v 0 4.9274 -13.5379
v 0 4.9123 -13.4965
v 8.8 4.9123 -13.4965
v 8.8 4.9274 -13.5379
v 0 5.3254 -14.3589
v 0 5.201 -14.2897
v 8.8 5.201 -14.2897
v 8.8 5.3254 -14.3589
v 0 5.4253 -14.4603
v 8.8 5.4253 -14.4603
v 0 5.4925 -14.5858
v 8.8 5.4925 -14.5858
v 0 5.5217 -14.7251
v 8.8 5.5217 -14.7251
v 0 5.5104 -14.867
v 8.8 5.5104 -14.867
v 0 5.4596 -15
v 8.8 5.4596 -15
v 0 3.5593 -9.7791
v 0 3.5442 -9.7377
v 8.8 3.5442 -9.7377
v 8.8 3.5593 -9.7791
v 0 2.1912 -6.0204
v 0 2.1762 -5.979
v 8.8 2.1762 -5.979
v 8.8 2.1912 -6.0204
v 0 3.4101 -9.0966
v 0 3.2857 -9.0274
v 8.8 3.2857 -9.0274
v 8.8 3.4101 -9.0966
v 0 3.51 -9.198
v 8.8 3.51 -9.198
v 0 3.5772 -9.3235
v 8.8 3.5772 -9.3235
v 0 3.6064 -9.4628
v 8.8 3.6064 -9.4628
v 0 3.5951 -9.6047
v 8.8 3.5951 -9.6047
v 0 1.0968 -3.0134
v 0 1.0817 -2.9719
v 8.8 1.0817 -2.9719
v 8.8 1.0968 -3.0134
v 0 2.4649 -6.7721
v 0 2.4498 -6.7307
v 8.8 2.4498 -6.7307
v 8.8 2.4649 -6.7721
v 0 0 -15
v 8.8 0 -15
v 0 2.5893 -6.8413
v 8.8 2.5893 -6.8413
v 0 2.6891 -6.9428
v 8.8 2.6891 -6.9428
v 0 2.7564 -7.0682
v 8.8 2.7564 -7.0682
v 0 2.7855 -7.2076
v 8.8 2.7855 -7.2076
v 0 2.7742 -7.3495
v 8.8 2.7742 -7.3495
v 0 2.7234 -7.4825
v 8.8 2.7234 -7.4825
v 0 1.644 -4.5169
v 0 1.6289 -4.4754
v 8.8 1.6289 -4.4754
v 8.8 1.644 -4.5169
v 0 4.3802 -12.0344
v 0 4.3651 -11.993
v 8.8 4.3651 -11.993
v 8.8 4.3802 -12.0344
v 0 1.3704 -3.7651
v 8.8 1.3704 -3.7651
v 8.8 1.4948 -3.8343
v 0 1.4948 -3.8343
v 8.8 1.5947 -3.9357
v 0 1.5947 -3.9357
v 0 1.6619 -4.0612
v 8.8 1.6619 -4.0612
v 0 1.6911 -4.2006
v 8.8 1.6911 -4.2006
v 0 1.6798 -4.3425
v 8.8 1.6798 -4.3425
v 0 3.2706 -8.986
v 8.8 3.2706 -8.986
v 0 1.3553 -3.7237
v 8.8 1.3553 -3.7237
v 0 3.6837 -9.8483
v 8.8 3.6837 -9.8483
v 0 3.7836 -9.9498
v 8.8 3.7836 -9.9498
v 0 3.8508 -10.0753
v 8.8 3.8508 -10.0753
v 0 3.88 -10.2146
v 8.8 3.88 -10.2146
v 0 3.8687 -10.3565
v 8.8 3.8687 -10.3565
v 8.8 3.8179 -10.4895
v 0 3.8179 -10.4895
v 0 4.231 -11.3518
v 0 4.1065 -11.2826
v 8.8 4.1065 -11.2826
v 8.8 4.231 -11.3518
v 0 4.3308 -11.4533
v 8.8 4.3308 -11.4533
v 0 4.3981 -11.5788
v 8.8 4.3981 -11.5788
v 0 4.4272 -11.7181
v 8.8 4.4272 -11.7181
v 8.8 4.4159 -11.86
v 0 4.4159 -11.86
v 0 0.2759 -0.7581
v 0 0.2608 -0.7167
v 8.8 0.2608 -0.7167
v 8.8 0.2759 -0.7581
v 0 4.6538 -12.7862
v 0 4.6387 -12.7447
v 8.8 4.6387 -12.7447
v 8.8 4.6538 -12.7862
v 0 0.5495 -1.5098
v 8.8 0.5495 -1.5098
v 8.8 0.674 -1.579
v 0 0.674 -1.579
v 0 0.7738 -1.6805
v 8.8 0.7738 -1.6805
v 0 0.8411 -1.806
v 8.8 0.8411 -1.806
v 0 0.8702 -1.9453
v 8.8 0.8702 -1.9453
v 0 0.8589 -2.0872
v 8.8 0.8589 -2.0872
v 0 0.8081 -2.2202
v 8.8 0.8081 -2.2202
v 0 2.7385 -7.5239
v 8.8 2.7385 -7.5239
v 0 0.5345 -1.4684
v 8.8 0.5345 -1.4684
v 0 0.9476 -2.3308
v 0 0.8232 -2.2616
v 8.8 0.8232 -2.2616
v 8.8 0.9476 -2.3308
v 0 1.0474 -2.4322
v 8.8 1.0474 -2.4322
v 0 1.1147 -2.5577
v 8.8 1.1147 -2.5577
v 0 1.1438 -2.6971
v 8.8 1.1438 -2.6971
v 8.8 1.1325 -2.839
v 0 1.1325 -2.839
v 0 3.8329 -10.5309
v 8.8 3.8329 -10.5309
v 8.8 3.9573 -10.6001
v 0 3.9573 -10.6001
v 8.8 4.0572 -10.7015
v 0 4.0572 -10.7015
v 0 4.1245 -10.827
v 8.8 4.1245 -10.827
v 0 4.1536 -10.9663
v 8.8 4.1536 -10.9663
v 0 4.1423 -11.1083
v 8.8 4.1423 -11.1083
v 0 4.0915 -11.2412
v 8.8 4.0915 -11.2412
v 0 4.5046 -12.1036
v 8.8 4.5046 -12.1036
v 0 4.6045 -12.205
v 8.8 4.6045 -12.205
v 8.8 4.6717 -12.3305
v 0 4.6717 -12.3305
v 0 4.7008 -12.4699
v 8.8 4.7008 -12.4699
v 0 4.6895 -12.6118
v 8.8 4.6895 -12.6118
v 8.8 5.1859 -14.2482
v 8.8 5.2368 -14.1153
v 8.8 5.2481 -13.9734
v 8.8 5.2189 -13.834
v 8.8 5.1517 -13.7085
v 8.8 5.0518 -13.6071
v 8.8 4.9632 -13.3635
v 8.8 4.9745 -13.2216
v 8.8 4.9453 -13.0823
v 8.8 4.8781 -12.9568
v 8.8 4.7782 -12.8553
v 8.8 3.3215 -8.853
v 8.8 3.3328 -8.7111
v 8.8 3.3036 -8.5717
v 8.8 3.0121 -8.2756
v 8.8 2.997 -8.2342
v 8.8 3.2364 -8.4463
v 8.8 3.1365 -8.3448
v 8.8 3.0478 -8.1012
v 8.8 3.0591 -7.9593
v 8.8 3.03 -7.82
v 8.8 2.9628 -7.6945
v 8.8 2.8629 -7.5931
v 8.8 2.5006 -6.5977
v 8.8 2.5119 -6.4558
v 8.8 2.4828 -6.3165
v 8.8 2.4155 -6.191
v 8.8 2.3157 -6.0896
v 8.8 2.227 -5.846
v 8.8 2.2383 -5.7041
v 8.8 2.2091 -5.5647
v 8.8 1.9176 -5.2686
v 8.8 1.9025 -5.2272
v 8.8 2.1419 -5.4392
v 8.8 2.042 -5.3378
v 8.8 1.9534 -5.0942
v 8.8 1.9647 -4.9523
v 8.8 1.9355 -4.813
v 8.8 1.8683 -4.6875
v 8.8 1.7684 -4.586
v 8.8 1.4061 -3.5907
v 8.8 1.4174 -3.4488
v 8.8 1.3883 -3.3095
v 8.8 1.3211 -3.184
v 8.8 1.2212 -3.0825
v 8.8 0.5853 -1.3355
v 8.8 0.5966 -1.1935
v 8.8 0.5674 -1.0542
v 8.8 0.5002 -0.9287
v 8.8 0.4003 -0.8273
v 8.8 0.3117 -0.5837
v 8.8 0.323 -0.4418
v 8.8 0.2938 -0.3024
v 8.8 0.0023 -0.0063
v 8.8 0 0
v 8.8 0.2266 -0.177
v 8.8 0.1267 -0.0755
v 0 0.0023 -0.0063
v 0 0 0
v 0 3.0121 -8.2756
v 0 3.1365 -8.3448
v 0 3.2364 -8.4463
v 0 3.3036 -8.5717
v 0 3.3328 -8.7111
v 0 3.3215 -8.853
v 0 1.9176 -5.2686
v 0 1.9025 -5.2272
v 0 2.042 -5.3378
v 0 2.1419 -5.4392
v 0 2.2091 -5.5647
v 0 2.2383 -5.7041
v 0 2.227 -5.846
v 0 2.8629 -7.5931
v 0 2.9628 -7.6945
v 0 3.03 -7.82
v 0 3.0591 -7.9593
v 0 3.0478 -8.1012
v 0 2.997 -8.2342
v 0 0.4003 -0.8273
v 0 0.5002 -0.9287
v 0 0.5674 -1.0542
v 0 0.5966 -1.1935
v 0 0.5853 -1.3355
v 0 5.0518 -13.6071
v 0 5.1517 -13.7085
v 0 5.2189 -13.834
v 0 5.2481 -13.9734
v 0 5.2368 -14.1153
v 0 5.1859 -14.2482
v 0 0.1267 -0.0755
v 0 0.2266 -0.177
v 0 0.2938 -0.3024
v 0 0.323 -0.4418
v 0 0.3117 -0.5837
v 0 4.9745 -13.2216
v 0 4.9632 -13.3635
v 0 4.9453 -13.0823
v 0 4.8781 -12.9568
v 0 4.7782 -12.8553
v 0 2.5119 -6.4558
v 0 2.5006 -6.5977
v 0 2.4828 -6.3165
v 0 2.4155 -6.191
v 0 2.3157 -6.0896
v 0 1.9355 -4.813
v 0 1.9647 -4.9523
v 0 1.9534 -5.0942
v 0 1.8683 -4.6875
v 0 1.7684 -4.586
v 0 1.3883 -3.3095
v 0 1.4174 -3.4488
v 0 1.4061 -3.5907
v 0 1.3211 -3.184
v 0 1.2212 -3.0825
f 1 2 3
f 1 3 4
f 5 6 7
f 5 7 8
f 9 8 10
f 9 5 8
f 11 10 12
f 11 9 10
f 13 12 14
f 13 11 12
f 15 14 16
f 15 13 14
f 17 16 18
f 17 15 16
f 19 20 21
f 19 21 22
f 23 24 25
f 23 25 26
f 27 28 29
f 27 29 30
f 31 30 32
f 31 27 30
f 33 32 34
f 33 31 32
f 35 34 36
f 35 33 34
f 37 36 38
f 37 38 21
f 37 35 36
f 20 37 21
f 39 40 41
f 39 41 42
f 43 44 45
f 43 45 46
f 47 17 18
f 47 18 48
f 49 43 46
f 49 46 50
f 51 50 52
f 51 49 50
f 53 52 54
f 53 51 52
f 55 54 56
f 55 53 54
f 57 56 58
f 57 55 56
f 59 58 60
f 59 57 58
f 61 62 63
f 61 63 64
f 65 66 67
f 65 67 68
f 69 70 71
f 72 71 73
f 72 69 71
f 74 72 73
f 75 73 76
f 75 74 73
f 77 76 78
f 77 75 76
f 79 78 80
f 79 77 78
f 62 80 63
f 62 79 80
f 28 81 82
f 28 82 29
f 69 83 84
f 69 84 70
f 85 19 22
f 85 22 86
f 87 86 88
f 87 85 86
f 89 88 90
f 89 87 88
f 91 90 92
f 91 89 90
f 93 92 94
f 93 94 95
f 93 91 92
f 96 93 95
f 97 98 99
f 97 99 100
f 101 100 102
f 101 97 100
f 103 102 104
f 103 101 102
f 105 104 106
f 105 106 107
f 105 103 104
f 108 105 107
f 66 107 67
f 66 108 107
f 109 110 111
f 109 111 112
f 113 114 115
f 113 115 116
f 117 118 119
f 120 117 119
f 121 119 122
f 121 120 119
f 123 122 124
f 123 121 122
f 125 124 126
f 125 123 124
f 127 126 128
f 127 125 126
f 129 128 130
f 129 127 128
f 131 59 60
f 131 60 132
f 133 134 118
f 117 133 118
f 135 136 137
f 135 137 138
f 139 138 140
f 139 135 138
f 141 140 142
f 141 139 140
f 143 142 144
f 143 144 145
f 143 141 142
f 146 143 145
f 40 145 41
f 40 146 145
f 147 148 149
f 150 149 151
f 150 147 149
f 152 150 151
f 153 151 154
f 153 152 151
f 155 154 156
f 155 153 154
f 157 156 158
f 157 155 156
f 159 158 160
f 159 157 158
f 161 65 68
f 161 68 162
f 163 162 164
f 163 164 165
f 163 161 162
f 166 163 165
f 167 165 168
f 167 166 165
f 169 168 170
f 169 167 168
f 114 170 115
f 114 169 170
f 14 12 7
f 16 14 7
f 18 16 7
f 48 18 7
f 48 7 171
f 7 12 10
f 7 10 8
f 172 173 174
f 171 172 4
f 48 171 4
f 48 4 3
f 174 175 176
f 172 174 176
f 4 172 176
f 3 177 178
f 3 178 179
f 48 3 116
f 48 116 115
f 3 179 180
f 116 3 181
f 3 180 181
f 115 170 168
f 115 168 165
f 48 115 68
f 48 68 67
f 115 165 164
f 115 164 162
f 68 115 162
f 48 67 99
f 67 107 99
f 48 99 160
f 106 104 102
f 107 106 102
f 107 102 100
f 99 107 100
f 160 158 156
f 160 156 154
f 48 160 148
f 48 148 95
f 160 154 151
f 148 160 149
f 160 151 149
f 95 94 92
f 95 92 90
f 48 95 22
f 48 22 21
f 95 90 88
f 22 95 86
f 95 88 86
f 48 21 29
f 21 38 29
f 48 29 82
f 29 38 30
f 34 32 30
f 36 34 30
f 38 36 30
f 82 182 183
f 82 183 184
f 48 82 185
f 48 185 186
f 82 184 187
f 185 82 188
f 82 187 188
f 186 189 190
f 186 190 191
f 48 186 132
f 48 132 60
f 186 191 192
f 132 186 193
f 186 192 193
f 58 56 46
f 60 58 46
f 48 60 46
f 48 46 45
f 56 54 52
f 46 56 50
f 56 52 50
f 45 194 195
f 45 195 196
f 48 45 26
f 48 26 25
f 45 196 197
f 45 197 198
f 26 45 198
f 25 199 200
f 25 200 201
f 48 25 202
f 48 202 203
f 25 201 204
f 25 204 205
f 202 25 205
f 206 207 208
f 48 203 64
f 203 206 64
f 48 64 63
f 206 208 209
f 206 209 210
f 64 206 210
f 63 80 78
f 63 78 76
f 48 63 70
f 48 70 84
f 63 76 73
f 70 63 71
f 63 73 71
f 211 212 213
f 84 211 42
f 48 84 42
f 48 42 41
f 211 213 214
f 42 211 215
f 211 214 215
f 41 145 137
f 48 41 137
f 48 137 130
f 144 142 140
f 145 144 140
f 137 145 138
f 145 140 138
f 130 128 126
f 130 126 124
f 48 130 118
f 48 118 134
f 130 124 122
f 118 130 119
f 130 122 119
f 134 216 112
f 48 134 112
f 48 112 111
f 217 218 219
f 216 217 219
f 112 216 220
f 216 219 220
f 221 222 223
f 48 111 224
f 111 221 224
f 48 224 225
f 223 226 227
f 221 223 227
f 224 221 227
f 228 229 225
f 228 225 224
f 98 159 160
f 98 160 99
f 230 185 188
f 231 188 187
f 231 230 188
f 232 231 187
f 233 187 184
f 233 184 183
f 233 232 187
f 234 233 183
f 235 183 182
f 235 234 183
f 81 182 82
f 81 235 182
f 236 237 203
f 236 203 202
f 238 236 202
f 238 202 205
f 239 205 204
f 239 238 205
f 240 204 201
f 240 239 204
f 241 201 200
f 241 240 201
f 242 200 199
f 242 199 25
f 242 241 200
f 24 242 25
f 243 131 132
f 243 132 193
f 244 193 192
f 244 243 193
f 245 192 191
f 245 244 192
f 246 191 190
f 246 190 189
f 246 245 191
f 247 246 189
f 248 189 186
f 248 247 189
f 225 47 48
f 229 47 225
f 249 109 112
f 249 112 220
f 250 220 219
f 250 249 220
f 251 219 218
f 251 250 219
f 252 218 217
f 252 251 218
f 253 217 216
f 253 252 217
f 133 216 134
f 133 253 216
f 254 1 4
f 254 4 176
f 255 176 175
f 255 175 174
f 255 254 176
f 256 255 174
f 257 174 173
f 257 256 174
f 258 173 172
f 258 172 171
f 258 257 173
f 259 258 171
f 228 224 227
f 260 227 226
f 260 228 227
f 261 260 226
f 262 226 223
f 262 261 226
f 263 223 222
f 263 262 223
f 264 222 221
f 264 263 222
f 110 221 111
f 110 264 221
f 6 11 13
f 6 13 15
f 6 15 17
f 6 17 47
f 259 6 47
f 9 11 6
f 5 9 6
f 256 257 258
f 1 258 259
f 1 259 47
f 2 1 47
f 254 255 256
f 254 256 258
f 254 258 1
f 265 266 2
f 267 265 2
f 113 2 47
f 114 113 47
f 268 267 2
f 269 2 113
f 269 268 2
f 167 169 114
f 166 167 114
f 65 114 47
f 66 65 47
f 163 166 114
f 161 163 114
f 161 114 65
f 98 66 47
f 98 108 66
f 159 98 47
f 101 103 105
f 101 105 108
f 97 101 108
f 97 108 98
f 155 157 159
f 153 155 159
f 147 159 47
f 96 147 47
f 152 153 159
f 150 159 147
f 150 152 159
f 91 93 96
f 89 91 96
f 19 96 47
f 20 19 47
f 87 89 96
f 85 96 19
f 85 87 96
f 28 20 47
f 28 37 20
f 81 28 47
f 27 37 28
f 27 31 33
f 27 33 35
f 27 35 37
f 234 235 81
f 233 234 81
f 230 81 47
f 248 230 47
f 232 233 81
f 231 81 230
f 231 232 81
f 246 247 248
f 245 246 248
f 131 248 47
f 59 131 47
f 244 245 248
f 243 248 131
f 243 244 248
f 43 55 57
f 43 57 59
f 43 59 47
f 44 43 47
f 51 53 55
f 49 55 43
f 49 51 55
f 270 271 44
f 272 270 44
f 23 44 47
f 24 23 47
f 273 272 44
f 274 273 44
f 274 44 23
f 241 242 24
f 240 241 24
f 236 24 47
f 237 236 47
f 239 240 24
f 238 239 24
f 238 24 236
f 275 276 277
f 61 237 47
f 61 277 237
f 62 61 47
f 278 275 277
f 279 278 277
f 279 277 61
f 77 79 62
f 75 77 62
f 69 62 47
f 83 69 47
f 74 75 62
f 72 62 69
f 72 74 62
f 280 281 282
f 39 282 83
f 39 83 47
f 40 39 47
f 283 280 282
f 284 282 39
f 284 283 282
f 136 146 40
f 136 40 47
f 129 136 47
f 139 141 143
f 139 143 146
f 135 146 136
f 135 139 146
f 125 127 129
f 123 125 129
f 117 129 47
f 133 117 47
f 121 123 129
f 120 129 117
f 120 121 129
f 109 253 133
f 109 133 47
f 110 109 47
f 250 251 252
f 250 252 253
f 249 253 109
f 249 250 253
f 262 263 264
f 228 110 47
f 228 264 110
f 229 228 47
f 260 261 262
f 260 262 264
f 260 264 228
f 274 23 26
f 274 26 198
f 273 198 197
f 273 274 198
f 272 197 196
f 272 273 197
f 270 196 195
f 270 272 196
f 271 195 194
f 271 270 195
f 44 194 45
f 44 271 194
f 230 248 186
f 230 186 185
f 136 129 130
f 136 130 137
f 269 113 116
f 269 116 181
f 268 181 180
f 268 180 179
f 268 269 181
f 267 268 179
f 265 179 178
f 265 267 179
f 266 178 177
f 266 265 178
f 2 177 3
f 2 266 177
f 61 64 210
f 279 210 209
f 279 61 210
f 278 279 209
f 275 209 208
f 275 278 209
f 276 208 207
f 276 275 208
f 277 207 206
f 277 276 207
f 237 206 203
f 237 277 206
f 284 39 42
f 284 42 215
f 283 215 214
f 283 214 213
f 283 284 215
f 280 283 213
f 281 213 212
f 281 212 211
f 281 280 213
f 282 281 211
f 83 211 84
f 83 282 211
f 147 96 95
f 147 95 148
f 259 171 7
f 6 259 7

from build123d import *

# Parameters (mm, degrees)
BOSS_EXTRUDE1_DEPTH = 8.8
BOSS_EXTRUDE3_DEPTH = 8.8


with BuildPart() as part:
    # Sketch1 → Boss-Extrude1 (new body)
    with BuildSketch(Plane(origin=(0, 0, 0), x_dir=(0, 0, -1), z_dir=(1, 0, 0))):
        Polygon((0, 0), (15, 5.459553514), (15, 0), align=None)
    extrude(amount=BOSS_EXTRUDE1_DEPTH)

    # Sketch2 → Boss-Extrude3 (add)
    with BuildSketch(Plane.ZY):
        with BuildLine():
            Line((-15, 5.459553514), (-14.289665454, 5.201012883))
            ThreePointArc((-14.289665454, 5.201012883), (-14.585776352, 5.492539256), (-15, 5.459553514))
        make_face()
        with BuildLine():
            Line((-14.248245903, 5.185937399), (-13.537911358, 4.927396768))
            ThreePointArc((-13.537911358, 4.927396768), (-13.834022255, 5.218923141), (-14.248245903, 5.185937399))
        make_face()
        with BuildLine():
            Line((-13.496491807, 4.912321285), (-12.786157261, 4.653780654))
            ThreePointArc((-12.786157261, 4.653780654), (-13.082268159, 4.945307027), (-13.496491807, 4.912321285))
        make_face()
        with BuildLine():
            Line((-12.74473771, 4.63870517), (-12.034403164, 4.380164539))
            ThreePointArc((-12.034403164, 4.380164539), (-12.330514062, 4.671690912), (-12.74473771, 4.63870517))
        make_face()
        with BuildLine():
            Line((-11.992983613, 4.365089055), (-11.282649068, 4.106548424))
            ThreePointArc((-11.282649068, 4.106548424), (-11.578759965, 4.398074797), (-11.992983613, 4.365089055))
        make_face()
        with BuildLine():
            Line((-11.241229517, 4.091472941), (-10.530894971, 3.83293231))
            ThreePointArc((-10.530894971, 3.83293231), (-10.827005869, 4.124458683), (-11.241229517, 4.091472941))
        make_face()
        with BuildLine():
            Line((-10.48947542, 3.817856826), (-9.779140875, 3.559316195))
            ThreePointArc((-9.779140875, 3.559316195), (-10.075251772, 3.850842568), (-10.48947542, 3.817856826))
        make_face()
        with BuildLine():
            Line((-9.737721324, 3.544240711), (-9.027386778, 3.28570008))
            ThreePointArc((-9.027386778, 3.28570008), (-9.323497675, 3.577226453), (-9.737721324, 3.544240711))
        make_face()
        with BuildLine():
            Line((-8.985967227, 3.270624597), (-8.275632681, 3.012083966))
            ThreePointArc((-8.275632681, 3.012083966), (-8.571743579, 3.303610339), (-8.985967227, 3.270624597))
        make_face()
        with BuildLine():
            Line((-8.23421313, 2.997008482), (-7.523878585, 2.738467851))
            ThreePointArc((-7.523878585, 2.738467851), (-7.819989482, 3.029994224), (-8.23421313, 2.997008482))
        make_face()
        with BuildLine():
            Line((-7.482459034, 2.723392367), (-6.772124488, 2.464851736))
            ThreePointArc((-6.772124488, 2.464851736), (-7.068235386, 2.756378109), (-7.482459034, 2.723392367))
        make_face()
        with BuildLine():
            Line((-6.730704937, 2.449776253), (-6.020370391, 2.191235622))
            ThreePointArc((-6.020370391, 2.191235622), (-6.316481289, 2.482761995), (-6.730704937, 2.449776253))
        make_face()
        with BuildLine():
            Line((-5.97895084, 2.176160138), (-5.268616295, 1.917619507))
            ThreePointArc((-5.268616295, 1.917619507), (-5.564727192, 2.20914588), (-5.97895084, 2.176160138))
        make_face()
        with BuildLine():
            Line((-5.227196744, 1.902544023), (-4.516862198, 1.644003392))
            ThreePointArc((-4.516862198, 1.644003392), (-4.812973096, 1.935529765), (-5.227196744, 1.902544023))
        make_face()
        with BuildLine():
            Line((-4.475442647, 1.628927909), (-3.765108101, 1.370387278))
            ThreePointArc((-3.765108101, 1.370387278), (-4.061218999, 1.661913651), (-4.475442647, 1.628927909))
        make_face()
        with BuildLine():
            Line((-3.723688551, 1.355311794), (-3.013354005, 1.096771163))
            ThreePointArc((-3.013354005, 1.096771163), (-3.309464902, 1.388297536), (-3.723688551, 1.355311794))
        make_face()
        with BuildLine():
            Line((-2.971934454, 1.081695679), (-2.261599908, 0.823155048))
            ThreePointArc((-2.261599908, 0.823155048), (-2.557710806, 1.114681421), (-2.971934454, 1.081695679))
        make_face()
        with BuildLine():
            Line((-2.220180357, 0.808079565), (-1.509845812, 0.549538934))
            ThreePointArc((-1.509845812, 0.549538934), (-1.805956709, 0.841065307), (-2.220180357, 0.808079565))
        make_face()
        with BuildLine():
            Line((-1.468426261, 0.53446345), (-0.758091715, 0.275922819))
            ThreePointArc((-0.758091715, 0.275922819), (-1.054202613, 0.567449192), (-1.468426261, 0.53446345))
        make_face()
        with BuildLine():
            Line((-0.716672164, 0.260847335), (-0.006337618, 0.002306704))
            ThreePointArc((-0.006337618, 0.002306704), (-0.302448516, 0.293833077), (-0.716672164, 0.260847335))
        make_face()
    extrude(amount=-BOSS_EXTRUDE3_DEPTH)


solid = part.part
